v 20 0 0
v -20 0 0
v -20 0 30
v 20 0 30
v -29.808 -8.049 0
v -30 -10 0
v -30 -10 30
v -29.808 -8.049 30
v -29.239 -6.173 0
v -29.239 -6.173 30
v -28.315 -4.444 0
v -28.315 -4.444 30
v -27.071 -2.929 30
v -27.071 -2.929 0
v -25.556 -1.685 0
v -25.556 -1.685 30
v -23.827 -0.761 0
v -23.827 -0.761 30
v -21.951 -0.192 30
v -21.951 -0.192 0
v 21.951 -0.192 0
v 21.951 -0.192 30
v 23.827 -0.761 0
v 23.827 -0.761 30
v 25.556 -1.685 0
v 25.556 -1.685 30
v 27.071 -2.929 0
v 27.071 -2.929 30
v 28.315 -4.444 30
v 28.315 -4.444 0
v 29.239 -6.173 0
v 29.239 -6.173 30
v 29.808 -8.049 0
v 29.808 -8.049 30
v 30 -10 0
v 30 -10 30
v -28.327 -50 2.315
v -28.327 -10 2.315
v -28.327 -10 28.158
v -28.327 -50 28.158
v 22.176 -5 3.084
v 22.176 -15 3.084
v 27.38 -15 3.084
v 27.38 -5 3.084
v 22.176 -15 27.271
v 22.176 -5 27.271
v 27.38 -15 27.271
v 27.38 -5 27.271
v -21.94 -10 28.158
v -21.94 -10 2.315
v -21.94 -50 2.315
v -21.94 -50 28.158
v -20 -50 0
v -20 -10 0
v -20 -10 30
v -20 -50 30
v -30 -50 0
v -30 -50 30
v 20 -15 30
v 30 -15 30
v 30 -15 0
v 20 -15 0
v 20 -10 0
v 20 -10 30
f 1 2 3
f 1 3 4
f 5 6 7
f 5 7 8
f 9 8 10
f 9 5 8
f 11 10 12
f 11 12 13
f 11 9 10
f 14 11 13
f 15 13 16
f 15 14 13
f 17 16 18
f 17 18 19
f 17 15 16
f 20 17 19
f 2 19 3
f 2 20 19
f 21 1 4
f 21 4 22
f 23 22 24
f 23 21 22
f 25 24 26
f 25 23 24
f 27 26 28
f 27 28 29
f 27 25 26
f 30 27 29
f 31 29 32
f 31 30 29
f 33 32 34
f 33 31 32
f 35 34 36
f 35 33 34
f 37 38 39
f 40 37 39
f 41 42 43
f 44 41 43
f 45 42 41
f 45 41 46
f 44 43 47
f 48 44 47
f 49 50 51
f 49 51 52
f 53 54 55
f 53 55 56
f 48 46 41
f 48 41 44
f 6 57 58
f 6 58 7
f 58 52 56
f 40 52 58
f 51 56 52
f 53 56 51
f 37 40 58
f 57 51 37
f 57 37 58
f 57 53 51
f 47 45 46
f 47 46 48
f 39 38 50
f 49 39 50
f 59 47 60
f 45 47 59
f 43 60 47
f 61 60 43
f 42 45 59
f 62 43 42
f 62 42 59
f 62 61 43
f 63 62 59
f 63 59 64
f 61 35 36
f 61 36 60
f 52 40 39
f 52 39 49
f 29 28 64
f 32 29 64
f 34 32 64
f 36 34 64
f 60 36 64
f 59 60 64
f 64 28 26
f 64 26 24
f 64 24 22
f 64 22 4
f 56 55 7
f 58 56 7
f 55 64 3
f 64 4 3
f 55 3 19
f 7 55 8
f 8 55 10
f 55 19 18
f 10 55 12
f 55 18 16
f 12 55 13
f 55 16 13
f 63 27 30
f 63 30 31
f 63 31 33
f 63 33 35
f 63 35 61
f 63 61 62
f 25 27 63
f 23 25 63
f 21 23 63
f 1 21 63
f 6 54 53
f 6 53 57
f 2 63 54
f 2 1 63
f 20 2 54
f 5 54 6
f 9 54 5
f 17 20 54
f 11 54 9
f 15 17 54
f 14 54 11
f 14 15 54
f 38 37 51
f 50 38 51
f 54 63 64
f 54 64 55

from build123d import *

# Parameters (mm, degrees)
EXTRU_MINCE3_DEPTH      = 30
ESQUISSE9_W             = 6.386782908
ESQUISSE9_H             = 25.842816024
ENL_V_MAT_EXTRU_1_DEPTH = 40
ESQUISSE10_W            = 5.204045332
ESQUISSE10_H            = 24.186983419
ENL_V_MAT_EXTRU_2_DEPTH = 10


with BuildPart() as part:
    # Esquisse5 → Extru.-Mince3 (new body)
    with BuildSketch(Plane.XY):
        with BuildLine():
            Line((-30, -50), (-30, -10))
            ThreePointArc((-30, -10), (-27.071067812, -2.928932188), (-20, 0))
            Line((-20, 0), (20, 0))
            ThreePointArc((20, 0), (27.071067812, -2.928932188), (30, -10))
            Line((30, -10), (30, -15))
            Line((30, -15), (20, -15))
            Line((20, -15), (20, -10))
            Line((20, -10), (-20, -10))
            Line((-20, -10), (-20, -50))
            Line((-20, -50), (-30, -50))
        make_face()
    extrude(amount=EXTRU_MINCE3_DEPTH)

    # Esquisse9 → Enlèv. mat.-Extru.1 (cut)
    with BuildSketch(Plane.XZ.offset(50)):
        with Locations((-25.133173479, 15.236547515)):
            Rectangle(ESQUISSE9_W, ESQUISSE9_H)
    extrude(amount=-ENL_V_MAT_EXTRU_1_DEPTH, mode=Mode.SUBTRACT)

    # Esquisse10 → Enlèv. mat.-Extru.2 (cut)
    with BuildSketch(Plane.XZ.offset(15)):
        with Locations((24.778352206, 15.177410637)):
            Rectangle(ESQUISSE10_W, ESQUISSE10_H)
    extrude(amount=-ENL_V_MAT_EXTRU_2_DEPTH, mode=Mode.SUBTRACT)


solid = part.part
